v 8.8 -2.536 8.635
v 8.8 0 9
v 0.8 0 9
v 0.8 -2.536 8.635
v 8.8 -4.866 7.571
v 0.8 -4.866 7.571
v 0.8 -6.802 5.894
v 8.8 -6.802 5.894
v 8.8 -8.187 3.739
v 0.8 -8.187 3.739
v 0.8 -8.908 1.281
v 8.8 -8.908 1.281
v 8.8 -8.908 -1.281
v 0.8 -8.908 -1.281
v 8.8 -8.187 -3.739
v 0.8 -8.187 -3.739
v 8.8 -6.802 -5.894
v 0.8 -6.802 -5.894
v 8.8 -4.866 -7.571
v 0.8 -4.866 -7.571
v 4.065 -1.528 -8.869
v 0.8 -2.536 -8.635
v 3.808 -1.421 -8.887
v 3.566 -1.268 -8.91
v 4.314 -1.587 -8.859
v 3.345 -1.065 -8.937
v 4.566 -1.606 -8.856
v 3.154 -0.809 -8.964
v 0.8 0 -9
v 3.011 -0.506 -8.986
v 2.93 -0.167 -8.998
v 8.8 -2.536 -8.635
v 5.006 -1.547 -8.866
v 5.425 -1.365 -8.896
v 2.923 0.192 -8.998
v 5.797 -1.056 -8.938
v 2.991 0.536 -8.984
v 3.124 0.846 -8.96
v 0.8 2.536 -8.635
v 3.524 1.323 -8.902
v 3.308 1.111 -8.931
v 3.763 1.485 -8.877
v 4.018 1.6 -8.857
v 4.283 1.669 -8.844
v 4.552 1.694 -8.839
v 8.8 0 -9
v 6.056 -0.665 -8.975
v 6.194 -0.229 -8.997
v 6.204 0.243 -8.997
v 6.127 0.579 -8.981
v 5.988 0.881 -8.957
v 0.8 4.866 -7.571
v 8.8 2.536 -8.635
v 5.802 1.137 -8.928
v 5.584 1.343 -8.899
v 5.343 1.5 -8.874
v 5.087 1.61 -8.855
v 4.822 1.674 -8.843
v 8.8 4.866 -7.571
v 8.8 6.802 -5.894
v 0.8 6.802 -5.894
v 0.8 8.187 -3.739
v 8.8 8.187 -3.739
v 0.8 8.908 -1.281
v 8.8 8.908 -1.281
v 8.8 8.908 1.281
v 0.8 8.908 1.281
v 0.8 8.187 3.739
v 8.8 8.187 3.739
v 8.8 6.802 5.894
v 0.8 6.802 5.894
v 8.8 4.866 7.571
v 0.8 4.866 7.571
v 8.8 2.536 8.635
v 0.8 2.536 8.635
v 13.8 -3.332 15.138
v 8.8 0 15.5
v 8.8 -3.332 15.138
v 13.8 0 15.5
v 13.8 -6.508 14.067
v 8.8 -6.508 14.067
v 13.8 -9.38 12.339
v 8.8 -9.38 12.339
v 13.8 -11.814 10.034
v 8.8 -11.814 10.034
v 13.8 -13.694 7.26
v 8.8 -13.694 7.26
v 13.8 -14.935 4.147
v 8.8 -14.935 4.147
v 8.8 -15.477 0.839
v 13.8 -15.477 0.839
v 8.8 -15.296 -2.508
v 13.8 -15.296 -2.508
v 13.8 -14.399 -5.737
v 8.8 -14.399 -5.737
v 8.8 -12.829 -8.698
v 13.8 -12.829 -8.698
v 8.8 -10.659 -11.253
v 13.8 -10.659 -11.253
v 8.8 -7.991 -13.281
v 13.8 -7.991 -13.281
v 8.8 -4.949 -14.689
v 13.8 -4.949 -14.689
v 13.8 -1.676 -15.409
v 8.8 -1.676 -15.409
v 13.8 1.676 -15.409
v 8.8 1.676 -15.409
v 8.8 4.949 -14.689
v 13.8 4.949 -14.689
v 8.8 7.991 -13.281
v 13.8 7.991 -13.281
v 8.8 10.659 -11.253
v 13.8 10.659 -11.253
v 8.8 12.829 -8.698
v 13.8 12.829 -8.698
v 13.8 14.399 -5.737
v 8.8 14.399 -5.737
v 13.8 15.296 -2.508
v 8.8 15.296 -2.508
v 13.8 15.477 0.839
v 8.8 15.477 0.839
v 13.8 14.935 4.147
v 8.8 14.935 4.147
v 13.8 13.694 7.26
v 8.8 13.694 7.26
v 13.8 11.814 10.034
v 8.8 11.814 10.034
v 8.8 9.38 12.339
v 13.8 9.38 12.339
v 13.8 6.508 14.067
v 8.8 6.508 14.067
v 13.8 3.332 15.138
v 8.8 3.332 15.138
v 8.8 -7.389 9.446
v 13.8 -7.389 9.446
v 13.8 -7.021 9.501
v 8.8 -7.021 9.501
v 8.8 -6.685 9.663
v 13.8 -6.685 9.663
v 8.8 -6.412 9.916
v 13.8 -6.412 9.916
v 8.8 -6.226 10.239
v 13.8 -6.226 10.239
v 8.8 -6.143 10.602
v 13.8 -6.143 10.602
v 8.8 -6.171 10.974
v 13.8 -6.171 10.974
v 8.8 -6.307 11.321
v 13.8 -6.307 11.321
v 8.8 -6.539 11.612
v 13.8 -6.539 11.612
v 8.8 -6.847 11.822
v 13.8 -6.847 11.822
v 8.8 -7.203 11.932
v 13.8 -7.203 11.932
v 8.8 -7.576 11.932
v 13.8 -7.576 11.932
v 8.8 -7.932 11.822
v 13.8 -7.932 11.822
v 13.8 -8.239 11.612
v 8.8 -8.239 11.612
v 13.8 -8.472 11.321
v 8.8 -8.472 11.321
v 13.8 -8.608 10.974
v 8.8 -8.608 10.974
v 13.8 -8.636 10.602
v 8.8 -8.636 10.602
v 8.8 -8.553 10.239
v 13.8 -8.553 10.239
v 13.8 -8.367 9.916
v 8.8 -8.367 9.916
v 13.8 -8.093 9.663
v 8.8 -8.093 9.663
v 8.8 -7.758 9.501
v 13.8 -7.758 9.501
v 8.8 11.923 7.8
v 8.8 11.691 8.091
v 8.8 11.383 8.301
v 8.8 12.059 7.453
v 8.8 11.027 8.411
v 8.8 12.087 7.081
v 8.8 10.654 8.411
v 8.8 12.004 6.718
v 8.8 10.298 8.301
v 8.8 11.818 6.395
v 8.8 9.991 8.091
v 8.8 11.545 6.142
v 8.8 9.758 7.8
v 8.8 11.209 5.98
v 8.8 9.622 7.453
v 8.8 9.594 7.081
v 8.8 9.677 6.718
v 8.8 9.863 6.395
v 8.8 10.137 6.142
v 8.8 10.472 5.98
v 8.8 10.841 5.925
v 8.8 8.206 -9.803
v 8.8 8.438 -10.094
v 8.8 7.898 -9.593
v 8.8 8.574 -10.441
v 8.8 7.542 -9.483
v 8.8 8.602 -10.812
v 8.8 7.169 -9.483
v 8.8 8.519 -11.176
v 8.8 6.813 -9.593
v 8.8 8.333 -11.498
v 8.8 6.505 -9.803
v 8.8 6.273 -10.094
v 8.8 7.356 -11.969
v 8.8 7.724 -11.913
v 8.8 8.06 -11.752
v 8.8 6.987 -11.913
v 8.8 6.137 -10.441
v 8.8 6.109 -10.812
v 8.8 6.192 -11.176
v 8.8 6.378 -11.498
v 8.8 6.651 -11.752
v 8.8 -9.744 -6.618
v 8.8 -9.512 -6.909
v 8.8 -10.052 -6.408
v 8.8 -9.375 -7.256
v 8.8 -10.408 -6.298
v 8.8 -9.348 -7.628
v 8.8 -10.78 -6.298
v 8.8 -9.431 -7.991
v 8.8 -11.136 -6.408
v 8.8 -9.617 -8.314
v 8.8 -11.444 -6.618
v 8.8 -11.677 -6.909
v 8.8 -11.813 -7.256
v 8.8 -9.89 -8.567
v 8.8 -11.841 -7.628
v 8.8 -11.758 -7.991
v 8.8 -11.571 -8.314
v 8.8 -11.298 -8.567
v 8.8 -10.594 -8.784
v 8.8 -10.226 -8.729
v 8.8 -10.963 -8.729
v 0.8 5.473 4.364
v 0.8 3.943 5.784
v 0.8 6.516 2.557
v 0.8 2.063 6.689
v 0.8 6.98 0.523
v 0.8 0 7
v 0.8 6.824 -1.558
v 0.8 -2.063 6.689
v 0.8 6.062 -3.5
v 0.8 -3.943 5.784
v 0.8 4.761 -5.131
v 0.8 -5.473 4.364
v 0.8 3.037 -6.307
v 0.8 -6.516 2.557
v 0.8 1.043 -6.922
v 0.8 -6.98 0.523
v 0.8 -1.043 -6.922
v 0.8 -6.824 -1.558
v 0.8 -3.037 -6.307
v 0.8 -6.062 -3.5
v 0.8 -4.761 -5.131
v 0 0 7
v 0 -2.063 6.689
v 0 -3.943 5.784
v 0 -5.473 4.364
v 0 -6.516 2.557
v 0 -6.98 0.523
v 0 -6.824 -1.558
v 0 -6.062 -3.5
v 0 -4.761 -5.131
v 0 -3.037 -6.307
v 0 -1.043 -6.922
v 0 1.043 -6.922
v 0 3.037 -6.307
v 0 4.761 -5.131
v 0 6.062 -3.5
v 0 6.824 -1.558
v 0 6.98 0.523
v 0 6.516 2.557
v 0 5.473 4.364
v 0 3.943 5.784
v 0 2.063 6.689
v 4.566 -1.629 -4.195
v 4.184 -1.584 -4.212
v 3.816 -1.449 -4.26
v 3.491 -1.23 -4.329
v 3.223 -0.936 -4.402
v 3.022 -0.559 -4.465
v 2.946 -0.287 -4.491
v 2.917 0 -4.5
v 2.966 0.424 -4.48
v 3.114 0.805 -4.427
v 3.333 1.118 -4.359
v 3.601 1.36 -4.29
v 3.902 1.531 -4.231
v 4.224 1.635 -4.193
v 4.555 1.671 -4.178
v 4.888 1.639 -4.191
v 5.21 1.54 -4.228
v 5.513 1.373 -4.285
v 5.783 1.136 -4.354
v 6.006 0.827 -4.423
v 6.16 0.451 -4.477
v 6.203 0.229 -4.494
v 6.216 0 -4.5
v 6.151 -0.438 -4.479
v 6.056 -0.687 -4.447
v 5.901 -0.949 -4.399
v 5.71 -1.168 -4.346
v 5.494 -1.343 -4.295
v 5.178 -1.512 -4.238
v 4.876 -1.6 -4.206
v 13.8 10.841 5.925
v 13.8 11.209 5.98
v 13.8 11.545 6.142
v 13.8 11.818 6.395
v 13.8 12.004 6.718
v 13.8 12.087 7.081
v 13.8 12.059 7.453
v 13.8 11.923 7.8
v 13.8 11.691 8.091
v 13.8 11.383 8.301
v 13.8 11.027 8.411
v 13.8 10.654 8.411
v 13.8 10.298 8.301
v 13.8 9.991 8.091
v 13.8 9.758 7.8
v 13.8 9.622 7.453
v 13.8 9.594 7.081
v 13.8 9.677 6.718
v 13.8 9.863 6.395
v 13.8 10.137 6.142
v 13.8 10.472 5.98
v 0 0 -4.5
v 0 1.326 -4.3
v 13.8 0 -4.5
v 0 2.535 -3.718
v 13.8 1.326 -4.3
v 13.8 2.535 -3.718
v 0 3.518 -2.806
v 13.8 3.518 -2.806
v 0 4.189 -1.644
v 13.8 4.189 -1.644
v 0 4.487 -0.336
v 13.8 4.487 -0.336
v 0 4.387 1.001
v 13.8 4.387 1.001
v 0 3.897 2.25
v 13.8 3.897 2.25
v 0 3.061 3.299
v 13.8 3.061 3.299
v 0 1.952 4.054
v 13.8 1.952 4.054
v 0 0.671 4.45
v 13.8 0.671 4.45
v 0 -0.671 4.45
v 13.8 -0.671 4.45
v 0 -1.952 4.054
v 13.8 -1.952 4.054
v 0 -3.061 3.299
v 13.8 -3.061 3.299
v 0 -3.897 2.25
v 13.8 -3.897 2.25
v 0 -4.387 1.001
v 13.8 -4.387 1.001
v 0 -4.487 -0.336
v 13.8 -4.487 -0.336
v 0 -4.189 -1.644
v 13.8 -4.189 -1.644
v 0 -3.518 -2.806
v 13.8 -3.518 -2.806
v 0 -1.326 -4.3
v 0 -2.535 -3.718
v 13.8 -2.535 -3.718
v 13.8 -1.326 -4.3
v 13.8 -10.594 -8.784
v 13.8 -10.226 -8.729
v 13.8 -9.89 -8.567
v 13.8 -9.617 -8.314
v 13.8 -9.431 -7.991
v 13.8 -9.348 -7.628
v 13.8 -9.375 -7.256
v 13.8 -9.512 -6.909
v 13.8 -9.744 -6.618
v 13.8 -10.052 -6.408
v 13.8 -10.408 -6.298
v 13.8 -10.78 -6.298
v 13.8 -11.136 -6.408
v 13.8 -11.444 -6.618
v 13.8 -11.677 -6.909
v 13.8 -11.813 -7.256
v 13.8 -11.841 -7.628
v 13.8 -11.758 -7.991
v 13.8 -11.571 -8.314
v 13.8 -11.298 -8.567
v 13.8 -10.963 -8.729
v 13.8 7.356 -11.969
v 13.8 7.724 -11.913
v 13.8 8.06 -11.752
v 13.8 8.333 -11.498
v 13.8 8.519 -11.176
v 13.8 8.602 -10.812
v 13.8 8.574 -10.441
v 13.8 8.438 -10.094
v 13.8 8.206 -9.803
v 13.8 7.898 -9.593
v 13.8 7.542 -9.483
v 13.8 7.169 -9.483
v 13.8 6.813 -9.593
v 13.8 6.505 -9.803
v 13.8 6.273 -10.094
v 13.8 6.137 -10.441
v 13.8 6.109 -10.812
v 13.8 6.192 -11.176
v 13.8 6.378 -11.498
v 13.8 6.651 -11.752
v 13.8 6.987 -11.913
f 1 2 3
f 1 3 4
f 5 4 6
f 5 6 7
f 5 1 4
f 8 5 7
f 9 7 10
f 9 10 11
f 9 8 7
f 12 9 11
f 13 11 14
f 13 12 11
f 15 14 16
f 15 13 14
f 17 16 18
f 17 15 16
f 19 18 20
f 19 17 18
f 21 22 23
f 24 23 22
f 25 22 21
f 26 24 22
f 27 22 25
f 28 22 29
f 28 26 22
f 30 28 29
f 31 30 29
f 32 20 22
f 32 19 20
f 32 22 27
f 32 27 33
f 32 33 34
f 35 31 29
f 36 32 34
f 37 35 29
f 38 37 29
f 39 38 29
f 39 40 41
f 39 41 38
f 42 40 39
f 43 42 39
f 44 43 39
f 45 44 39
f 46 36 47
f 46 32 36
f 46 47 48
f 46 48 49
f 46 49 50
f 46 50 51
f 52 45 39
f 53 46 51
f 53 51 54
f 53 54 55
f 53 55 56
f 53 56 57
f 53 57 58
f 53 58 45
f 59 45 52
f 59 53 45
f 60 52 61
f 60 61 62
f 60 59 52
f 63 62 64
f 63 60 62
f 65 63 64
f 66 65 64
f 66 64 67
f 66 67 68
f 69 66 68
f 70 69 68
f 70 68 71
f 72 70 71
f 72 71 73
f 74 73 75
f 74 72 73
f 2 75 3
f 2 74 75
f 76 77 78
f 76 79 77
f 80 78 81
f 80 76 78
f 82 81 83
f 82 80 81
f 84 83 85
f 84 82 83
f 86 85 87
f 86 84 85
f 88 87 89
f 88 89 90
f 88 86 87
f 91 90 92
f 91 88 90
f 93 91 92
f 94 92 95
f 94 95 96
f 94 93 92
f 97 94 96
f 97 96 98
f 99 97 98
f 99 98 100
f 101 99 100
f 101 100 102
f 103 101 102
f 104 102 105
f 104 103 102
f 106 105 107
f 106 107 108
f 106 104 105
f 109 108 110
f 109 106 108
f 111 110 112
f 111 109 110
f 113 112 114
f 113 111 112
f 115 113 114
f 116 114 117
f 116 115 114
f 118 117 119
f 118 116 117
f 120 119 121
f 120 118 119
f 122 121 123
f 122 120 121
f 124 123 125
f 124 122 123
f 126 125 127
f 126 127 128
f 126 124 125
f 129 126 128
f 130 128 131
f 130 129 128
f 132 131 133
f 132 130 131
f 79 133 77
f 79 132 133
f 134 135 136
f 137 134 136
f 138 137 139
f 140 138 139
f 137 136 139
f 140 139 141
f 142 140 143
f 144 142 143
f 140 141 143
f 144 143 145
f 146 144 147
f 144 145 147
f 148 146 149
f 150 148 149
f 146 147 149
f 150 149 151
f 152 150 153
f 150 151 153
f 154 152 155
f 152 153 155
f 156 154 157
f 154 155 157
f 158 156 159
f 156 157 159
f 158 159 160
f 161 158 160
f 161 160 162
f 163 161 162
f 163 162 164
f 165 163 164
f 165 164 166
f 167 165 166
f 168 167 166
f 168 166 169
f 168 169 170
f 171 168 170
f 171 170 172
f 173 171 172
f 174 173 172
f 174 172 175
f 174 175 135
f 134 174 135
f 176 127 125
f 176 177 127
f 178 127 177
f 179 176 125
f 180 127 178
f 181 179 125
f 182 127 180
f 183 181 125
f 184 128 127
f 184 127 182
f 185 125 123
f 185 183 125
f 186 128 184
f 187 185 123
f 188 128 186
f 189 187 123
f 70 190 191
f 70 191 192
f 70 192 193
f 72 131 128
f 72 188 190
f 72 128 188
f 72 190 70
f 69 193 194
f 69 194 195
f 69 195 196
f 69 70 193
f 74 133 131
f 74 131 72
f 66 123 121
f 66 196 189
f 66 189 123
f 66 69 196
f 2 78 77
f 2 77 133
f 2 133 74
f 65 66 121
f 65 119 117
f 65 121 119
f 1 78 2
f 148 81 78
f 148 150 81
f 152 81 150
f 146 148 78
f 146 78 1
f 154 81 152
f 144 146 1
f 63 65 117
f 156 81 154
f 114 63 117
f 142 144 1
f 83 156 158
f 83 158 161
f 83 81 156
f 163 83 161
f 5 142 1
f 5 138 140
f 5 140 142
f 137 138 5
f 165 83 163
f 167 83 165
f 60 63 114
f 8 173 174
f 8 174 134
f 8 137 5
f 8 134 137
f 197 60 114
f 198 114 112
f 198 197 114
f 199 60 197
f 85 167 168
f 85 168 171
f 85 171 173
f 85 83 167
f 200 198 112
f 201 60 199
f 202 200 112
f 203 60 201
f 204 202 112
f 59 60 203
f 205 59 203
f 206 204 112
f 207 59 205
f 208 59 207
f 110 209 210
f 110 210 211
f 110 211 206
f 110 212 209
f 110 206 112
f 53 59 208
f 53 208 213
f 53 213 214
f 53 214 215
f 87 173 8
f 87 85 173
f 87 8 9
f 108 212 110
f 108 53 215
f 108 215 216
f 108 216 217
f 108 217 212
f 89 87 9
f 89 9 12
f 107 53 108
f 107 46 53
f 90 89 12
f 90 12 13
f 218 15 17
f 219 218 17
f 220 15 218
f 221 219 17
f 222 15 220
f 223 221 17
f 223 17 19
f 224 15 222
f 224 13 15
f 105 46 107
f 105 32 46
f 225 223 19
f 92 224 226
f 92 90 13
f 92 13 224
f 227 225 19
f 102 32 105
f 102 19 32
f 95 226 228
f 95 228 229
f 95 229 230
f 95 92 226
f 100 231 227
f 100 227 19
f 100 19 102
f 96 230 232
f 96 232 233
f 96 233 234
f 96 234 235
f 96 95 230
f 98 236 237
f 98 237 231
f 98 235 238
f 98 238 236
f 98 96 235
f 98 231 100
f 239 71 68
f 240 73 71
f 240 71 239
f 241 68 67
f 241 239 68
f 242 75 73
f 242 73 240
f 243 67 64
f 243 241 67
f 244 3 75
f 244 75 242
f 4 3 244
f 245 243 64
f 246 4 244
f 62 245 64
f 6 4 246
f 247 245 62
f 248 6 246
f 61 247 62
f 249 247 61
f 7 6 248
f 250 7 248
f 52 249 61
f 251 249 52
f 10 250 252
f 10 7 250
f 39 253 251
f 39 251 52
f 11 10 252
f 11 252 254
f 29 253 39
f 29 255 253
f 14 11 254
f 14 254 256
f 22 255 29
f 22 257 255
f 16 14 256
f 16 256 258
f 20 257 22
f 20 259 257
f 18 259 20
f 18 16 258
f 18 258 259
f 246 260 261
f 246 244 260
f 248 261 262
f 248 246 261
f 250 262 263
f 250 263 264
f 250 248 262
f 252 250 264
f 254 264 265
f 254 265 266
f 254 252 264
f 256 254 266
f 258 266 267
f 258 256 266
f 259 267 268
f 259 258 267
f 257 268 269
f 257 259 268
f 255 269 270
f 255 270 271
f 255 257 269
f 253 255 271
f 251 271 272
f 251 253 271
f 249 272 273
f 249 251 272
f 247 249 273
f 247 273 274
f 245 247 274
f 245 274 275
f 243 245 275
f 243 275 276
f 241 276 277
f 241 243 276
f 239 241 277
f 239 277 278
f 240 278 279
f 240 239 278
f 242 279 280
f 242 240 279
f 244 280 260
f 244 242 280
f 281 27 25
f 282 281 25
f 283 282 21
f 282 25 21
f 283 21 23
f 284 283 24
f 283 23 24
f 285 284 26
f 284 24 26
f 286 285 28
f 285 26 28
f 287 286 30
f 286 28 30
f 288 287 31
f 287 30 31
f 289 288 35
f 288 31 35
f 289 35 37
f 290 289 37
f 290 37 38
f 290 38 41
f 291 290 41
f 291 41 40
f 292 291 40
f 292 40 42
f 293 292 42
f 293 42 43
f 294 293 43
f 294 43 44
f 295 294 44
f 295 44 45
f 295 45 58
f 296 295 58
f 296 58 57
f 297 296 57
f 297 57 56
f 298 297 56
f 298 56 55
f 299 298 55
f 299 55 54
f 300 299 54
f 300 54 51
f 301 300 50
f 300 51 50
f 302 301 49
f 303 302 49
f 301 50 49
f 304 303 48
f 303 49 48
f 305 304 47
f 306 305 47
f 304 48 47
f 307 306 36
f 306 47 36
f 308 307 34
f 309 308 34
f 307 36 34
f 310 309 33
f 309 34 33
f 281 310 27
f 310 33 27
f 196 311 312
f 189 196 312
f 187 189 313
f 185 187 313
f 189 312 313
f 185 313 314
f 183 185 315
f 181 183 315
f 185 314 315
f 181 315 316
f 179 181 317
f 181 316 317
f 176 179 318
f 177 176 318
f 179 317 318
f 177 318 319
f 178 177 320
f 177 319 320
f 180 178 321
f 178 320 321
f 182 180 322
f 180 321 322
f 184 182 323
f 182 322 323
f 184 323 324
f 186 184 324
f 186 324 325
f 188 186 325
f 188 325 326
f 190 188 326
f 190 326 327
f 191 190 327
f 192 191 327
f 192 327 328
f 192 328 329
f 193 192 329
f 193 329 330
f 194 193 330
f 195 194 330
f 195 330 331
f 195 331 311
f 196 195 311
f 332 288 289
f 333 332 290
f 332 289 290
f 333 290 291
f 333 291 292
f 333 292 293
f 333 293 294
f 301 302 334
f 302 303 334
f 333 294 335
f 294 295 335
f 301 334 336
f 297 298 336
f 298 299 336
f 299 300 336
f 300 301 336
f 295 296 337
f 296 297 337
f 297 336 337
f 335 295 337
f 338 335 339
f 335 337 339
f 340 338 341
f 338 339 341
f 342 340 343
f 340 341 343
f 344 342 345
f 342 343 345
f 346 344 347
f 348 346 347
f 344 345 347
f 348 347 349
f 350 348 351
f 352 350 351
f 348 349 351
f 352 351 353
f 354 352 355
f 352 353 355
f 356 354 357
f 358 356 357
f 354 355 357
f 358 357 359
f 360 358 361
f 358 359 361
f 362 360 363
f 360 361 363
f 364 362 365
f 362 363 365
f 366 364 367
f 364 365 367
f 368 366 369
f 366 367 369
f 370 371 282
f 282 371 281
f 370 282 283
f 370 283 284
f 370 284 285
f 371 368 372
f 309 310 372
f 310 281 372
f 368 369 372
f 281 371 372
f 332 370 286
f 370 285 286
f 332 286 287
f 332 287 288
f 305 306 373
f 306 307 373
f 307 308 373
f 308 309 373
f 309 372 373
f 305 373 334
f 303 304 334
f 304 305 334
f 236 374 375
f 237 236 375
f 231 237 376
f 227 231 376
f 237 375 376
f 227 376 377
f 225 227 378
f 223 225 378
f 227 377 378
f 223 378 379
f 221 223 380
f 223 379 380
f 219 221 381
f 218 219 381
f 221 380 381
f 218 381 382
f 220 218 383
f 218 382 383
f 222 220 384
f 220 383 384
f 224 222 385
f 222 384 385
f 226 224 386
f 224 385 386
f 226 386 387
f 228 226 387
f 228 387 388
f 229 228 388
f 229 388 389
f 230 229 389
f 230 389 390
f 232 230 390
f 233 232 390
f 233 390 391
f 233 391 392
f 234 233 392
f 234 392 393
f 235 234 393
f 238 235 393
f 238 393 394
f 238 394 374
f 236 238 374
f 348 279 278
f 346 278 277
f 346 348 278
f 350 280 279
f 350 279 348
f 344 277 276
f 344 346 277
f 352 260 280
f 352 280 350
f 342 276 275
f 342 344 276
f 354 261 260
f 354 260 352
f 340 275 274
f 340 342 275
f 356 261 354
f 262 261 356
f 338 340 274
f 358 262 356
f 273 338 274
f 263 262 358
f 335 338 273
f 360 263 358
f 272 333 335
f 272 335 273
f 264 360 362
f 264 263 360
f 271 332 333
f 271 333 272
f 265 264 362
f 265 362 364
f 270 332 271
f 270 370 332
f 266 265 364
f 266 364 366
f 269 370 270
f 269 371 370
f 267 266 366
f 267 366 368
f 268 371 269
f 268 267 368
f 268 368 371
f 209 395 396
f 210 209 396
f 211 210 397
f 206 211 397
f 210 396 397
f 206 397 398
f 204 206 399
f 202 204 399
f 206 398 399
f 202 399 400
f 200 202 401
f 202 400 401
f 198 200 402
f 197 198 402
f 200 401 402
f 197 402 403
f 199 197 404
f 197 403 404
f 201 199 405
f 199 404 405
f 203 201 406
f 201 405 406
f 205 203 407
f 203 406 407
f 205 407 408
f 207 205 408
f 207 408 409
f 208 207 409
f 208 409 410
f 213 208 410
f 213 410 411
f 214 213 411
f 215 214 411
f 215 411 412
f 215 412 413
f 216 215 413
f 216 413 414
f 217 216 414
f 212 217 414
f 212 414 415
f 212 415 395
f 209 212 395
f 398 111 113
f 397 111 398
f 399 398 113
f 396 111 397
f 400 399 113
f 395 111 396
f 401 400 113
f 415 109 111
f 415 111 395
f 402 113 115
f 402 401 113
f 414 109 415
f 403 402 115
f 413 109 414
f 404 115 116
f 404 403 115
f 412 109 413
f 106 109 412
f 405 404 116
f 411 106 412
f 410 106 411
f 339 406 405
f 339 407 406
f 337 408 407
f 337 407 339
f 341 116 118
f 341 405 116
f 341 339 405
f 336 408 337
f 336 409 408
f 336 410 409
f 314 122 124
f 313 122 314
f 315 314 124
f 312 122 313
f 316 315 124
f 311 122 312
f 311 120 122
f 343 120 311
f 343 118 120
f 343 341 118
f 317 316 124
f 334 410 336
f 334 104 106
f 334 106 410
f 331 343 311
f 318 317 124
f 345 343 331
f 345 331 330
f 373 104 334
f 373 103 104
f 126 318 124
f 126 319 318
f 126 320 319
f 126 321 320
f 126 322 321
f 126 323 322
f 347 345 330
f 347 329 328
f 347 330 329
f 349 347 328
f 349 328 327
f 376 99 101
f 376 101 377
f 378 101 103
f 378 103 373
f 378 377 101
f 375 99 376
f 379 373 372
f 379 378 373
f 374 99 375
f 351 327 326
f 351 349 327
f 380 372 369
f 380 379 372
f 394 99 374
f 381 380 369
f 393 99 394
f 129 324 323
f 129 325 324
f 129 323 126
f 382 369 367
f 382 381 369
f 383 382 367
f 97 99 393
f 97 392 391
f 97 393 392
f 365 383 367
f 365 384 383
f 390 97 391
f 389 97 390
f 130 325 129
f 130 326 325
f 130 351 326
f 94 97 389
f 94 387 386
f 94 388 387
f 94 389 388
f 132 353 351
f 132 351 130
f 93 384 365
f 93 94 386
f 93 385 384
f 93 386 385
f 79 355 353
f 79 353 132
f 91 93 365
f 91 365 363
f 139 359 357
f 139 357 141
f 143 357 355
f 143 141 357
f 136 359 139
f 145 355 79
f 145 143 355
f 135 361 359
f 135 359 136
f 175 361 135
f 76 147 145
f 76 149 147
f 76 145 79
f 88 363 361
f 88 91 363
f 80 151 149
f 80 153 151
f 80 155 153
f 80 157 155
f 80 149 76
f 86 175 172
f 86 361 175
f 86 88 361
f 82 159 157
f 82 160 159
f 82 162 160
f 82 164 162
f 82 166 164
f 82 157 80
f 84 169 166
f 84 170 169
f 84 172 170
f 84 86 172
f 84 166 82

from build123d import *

# Parameters (mm, degrees)
D_GAGEMENT_M81_D                              = 9
D_GAGEMENT_M81_DEPTH                          = 13.8
TROU_POUR_TARAUDAGE_POUR_TROU_TARAUD_M4_REACH = 26.576
TROU_POUR_TARAUDAGE_POUR_TROU_TARAUD_2_R      = 1.65
TROU_POUR_TARAUDAGE_POUR_TROU_TARAUD_M3_D     = 2.5
TROU_POUR_TARAUDAGE_POUR_TROU_TARAUD_M3_DEPTH = 5


with BuildPart() as part:
    # Esquisse1 → Révolution1 (revolve)
    with BuildSketch(Plane.XY, mode=Mode.PRIVATE) as r_volution1_sk:
        Polygon((0, 0), (0, 7), (0.8, 7), (0.8, 9), (8.8, 9), (8.8, 15.5), (13.8, 15.5), (13.8, 0), align=None)
    revolve(r_volution1_sk.sketch.rotate(Axis((0, 0, 0), (1, 0, 0)), 90), axis=Axis((0, 0, 0), (1, 0, 0)))  # turned: the seam where the file's is

    # Dégagement M81
    with Locations(Plane.ZY):
        with Locations((0, 0)):
            Hole(D_GAGEMENT_M81_D / 2, depth=D_GAGEMENT_M81_DEPTH)

    # Trou pour taraudage pour trou taraud 2 (on position points) → Trou pour taraudage pour trou taraudé M4x0.71 (cut, up to next)
    with BuildSketch(Plane(origin=(4.566426523, 0.044478819, -8.99989009), x_dir=(0, -0.999987788, -0.004942091), z_dir=(0, 0.004942091, -0.999987788)), mode=Mode.PRIVATE) as trou_pour_taraudage_pour_trou_taraud_m4_sk1:
        Circle(TROU_POUR_TARAUDAGE_POUR_TROU_TARAUD_2_R)
    trou_pour_taraudage_pour_trou_taraud_m4_tool1 = extrude(trou_pour_taraudage_pour_trou_taraud_m4_sk1.sketch, amount=-TROU_POUR_TARAUDAGE_POUR_TROU_TARAUD_M4_REACH, mode=Mode.PRIVATE) & part.part
    add(trou_pour_taraudage_pour_trou_taraud_m4_tool1.solids().sort_by_distance((4.566427, 0.044479, -8.99989))[0], mode=Mode.SUBTRACT)

    # Trou pour taraudage pour trou taraudé M3x0.51
    with Locations(Plane.ZY.offset(-8.8)):
        with Locations((-10.718944801, 7.355557243), (7.174803364, 10.840765503), (10.695756801, -7.389234497), (-7.534243199, -10.594110601)):
            Hole(TROU_POUR_TARAUDAGE_POUR_TROU_TARAUD_M3_D / 2, depth=TROU_POUR_TARAUDAGE_POUR_TROU_TARAUD_M3_DEPTH)


solid = part.part
